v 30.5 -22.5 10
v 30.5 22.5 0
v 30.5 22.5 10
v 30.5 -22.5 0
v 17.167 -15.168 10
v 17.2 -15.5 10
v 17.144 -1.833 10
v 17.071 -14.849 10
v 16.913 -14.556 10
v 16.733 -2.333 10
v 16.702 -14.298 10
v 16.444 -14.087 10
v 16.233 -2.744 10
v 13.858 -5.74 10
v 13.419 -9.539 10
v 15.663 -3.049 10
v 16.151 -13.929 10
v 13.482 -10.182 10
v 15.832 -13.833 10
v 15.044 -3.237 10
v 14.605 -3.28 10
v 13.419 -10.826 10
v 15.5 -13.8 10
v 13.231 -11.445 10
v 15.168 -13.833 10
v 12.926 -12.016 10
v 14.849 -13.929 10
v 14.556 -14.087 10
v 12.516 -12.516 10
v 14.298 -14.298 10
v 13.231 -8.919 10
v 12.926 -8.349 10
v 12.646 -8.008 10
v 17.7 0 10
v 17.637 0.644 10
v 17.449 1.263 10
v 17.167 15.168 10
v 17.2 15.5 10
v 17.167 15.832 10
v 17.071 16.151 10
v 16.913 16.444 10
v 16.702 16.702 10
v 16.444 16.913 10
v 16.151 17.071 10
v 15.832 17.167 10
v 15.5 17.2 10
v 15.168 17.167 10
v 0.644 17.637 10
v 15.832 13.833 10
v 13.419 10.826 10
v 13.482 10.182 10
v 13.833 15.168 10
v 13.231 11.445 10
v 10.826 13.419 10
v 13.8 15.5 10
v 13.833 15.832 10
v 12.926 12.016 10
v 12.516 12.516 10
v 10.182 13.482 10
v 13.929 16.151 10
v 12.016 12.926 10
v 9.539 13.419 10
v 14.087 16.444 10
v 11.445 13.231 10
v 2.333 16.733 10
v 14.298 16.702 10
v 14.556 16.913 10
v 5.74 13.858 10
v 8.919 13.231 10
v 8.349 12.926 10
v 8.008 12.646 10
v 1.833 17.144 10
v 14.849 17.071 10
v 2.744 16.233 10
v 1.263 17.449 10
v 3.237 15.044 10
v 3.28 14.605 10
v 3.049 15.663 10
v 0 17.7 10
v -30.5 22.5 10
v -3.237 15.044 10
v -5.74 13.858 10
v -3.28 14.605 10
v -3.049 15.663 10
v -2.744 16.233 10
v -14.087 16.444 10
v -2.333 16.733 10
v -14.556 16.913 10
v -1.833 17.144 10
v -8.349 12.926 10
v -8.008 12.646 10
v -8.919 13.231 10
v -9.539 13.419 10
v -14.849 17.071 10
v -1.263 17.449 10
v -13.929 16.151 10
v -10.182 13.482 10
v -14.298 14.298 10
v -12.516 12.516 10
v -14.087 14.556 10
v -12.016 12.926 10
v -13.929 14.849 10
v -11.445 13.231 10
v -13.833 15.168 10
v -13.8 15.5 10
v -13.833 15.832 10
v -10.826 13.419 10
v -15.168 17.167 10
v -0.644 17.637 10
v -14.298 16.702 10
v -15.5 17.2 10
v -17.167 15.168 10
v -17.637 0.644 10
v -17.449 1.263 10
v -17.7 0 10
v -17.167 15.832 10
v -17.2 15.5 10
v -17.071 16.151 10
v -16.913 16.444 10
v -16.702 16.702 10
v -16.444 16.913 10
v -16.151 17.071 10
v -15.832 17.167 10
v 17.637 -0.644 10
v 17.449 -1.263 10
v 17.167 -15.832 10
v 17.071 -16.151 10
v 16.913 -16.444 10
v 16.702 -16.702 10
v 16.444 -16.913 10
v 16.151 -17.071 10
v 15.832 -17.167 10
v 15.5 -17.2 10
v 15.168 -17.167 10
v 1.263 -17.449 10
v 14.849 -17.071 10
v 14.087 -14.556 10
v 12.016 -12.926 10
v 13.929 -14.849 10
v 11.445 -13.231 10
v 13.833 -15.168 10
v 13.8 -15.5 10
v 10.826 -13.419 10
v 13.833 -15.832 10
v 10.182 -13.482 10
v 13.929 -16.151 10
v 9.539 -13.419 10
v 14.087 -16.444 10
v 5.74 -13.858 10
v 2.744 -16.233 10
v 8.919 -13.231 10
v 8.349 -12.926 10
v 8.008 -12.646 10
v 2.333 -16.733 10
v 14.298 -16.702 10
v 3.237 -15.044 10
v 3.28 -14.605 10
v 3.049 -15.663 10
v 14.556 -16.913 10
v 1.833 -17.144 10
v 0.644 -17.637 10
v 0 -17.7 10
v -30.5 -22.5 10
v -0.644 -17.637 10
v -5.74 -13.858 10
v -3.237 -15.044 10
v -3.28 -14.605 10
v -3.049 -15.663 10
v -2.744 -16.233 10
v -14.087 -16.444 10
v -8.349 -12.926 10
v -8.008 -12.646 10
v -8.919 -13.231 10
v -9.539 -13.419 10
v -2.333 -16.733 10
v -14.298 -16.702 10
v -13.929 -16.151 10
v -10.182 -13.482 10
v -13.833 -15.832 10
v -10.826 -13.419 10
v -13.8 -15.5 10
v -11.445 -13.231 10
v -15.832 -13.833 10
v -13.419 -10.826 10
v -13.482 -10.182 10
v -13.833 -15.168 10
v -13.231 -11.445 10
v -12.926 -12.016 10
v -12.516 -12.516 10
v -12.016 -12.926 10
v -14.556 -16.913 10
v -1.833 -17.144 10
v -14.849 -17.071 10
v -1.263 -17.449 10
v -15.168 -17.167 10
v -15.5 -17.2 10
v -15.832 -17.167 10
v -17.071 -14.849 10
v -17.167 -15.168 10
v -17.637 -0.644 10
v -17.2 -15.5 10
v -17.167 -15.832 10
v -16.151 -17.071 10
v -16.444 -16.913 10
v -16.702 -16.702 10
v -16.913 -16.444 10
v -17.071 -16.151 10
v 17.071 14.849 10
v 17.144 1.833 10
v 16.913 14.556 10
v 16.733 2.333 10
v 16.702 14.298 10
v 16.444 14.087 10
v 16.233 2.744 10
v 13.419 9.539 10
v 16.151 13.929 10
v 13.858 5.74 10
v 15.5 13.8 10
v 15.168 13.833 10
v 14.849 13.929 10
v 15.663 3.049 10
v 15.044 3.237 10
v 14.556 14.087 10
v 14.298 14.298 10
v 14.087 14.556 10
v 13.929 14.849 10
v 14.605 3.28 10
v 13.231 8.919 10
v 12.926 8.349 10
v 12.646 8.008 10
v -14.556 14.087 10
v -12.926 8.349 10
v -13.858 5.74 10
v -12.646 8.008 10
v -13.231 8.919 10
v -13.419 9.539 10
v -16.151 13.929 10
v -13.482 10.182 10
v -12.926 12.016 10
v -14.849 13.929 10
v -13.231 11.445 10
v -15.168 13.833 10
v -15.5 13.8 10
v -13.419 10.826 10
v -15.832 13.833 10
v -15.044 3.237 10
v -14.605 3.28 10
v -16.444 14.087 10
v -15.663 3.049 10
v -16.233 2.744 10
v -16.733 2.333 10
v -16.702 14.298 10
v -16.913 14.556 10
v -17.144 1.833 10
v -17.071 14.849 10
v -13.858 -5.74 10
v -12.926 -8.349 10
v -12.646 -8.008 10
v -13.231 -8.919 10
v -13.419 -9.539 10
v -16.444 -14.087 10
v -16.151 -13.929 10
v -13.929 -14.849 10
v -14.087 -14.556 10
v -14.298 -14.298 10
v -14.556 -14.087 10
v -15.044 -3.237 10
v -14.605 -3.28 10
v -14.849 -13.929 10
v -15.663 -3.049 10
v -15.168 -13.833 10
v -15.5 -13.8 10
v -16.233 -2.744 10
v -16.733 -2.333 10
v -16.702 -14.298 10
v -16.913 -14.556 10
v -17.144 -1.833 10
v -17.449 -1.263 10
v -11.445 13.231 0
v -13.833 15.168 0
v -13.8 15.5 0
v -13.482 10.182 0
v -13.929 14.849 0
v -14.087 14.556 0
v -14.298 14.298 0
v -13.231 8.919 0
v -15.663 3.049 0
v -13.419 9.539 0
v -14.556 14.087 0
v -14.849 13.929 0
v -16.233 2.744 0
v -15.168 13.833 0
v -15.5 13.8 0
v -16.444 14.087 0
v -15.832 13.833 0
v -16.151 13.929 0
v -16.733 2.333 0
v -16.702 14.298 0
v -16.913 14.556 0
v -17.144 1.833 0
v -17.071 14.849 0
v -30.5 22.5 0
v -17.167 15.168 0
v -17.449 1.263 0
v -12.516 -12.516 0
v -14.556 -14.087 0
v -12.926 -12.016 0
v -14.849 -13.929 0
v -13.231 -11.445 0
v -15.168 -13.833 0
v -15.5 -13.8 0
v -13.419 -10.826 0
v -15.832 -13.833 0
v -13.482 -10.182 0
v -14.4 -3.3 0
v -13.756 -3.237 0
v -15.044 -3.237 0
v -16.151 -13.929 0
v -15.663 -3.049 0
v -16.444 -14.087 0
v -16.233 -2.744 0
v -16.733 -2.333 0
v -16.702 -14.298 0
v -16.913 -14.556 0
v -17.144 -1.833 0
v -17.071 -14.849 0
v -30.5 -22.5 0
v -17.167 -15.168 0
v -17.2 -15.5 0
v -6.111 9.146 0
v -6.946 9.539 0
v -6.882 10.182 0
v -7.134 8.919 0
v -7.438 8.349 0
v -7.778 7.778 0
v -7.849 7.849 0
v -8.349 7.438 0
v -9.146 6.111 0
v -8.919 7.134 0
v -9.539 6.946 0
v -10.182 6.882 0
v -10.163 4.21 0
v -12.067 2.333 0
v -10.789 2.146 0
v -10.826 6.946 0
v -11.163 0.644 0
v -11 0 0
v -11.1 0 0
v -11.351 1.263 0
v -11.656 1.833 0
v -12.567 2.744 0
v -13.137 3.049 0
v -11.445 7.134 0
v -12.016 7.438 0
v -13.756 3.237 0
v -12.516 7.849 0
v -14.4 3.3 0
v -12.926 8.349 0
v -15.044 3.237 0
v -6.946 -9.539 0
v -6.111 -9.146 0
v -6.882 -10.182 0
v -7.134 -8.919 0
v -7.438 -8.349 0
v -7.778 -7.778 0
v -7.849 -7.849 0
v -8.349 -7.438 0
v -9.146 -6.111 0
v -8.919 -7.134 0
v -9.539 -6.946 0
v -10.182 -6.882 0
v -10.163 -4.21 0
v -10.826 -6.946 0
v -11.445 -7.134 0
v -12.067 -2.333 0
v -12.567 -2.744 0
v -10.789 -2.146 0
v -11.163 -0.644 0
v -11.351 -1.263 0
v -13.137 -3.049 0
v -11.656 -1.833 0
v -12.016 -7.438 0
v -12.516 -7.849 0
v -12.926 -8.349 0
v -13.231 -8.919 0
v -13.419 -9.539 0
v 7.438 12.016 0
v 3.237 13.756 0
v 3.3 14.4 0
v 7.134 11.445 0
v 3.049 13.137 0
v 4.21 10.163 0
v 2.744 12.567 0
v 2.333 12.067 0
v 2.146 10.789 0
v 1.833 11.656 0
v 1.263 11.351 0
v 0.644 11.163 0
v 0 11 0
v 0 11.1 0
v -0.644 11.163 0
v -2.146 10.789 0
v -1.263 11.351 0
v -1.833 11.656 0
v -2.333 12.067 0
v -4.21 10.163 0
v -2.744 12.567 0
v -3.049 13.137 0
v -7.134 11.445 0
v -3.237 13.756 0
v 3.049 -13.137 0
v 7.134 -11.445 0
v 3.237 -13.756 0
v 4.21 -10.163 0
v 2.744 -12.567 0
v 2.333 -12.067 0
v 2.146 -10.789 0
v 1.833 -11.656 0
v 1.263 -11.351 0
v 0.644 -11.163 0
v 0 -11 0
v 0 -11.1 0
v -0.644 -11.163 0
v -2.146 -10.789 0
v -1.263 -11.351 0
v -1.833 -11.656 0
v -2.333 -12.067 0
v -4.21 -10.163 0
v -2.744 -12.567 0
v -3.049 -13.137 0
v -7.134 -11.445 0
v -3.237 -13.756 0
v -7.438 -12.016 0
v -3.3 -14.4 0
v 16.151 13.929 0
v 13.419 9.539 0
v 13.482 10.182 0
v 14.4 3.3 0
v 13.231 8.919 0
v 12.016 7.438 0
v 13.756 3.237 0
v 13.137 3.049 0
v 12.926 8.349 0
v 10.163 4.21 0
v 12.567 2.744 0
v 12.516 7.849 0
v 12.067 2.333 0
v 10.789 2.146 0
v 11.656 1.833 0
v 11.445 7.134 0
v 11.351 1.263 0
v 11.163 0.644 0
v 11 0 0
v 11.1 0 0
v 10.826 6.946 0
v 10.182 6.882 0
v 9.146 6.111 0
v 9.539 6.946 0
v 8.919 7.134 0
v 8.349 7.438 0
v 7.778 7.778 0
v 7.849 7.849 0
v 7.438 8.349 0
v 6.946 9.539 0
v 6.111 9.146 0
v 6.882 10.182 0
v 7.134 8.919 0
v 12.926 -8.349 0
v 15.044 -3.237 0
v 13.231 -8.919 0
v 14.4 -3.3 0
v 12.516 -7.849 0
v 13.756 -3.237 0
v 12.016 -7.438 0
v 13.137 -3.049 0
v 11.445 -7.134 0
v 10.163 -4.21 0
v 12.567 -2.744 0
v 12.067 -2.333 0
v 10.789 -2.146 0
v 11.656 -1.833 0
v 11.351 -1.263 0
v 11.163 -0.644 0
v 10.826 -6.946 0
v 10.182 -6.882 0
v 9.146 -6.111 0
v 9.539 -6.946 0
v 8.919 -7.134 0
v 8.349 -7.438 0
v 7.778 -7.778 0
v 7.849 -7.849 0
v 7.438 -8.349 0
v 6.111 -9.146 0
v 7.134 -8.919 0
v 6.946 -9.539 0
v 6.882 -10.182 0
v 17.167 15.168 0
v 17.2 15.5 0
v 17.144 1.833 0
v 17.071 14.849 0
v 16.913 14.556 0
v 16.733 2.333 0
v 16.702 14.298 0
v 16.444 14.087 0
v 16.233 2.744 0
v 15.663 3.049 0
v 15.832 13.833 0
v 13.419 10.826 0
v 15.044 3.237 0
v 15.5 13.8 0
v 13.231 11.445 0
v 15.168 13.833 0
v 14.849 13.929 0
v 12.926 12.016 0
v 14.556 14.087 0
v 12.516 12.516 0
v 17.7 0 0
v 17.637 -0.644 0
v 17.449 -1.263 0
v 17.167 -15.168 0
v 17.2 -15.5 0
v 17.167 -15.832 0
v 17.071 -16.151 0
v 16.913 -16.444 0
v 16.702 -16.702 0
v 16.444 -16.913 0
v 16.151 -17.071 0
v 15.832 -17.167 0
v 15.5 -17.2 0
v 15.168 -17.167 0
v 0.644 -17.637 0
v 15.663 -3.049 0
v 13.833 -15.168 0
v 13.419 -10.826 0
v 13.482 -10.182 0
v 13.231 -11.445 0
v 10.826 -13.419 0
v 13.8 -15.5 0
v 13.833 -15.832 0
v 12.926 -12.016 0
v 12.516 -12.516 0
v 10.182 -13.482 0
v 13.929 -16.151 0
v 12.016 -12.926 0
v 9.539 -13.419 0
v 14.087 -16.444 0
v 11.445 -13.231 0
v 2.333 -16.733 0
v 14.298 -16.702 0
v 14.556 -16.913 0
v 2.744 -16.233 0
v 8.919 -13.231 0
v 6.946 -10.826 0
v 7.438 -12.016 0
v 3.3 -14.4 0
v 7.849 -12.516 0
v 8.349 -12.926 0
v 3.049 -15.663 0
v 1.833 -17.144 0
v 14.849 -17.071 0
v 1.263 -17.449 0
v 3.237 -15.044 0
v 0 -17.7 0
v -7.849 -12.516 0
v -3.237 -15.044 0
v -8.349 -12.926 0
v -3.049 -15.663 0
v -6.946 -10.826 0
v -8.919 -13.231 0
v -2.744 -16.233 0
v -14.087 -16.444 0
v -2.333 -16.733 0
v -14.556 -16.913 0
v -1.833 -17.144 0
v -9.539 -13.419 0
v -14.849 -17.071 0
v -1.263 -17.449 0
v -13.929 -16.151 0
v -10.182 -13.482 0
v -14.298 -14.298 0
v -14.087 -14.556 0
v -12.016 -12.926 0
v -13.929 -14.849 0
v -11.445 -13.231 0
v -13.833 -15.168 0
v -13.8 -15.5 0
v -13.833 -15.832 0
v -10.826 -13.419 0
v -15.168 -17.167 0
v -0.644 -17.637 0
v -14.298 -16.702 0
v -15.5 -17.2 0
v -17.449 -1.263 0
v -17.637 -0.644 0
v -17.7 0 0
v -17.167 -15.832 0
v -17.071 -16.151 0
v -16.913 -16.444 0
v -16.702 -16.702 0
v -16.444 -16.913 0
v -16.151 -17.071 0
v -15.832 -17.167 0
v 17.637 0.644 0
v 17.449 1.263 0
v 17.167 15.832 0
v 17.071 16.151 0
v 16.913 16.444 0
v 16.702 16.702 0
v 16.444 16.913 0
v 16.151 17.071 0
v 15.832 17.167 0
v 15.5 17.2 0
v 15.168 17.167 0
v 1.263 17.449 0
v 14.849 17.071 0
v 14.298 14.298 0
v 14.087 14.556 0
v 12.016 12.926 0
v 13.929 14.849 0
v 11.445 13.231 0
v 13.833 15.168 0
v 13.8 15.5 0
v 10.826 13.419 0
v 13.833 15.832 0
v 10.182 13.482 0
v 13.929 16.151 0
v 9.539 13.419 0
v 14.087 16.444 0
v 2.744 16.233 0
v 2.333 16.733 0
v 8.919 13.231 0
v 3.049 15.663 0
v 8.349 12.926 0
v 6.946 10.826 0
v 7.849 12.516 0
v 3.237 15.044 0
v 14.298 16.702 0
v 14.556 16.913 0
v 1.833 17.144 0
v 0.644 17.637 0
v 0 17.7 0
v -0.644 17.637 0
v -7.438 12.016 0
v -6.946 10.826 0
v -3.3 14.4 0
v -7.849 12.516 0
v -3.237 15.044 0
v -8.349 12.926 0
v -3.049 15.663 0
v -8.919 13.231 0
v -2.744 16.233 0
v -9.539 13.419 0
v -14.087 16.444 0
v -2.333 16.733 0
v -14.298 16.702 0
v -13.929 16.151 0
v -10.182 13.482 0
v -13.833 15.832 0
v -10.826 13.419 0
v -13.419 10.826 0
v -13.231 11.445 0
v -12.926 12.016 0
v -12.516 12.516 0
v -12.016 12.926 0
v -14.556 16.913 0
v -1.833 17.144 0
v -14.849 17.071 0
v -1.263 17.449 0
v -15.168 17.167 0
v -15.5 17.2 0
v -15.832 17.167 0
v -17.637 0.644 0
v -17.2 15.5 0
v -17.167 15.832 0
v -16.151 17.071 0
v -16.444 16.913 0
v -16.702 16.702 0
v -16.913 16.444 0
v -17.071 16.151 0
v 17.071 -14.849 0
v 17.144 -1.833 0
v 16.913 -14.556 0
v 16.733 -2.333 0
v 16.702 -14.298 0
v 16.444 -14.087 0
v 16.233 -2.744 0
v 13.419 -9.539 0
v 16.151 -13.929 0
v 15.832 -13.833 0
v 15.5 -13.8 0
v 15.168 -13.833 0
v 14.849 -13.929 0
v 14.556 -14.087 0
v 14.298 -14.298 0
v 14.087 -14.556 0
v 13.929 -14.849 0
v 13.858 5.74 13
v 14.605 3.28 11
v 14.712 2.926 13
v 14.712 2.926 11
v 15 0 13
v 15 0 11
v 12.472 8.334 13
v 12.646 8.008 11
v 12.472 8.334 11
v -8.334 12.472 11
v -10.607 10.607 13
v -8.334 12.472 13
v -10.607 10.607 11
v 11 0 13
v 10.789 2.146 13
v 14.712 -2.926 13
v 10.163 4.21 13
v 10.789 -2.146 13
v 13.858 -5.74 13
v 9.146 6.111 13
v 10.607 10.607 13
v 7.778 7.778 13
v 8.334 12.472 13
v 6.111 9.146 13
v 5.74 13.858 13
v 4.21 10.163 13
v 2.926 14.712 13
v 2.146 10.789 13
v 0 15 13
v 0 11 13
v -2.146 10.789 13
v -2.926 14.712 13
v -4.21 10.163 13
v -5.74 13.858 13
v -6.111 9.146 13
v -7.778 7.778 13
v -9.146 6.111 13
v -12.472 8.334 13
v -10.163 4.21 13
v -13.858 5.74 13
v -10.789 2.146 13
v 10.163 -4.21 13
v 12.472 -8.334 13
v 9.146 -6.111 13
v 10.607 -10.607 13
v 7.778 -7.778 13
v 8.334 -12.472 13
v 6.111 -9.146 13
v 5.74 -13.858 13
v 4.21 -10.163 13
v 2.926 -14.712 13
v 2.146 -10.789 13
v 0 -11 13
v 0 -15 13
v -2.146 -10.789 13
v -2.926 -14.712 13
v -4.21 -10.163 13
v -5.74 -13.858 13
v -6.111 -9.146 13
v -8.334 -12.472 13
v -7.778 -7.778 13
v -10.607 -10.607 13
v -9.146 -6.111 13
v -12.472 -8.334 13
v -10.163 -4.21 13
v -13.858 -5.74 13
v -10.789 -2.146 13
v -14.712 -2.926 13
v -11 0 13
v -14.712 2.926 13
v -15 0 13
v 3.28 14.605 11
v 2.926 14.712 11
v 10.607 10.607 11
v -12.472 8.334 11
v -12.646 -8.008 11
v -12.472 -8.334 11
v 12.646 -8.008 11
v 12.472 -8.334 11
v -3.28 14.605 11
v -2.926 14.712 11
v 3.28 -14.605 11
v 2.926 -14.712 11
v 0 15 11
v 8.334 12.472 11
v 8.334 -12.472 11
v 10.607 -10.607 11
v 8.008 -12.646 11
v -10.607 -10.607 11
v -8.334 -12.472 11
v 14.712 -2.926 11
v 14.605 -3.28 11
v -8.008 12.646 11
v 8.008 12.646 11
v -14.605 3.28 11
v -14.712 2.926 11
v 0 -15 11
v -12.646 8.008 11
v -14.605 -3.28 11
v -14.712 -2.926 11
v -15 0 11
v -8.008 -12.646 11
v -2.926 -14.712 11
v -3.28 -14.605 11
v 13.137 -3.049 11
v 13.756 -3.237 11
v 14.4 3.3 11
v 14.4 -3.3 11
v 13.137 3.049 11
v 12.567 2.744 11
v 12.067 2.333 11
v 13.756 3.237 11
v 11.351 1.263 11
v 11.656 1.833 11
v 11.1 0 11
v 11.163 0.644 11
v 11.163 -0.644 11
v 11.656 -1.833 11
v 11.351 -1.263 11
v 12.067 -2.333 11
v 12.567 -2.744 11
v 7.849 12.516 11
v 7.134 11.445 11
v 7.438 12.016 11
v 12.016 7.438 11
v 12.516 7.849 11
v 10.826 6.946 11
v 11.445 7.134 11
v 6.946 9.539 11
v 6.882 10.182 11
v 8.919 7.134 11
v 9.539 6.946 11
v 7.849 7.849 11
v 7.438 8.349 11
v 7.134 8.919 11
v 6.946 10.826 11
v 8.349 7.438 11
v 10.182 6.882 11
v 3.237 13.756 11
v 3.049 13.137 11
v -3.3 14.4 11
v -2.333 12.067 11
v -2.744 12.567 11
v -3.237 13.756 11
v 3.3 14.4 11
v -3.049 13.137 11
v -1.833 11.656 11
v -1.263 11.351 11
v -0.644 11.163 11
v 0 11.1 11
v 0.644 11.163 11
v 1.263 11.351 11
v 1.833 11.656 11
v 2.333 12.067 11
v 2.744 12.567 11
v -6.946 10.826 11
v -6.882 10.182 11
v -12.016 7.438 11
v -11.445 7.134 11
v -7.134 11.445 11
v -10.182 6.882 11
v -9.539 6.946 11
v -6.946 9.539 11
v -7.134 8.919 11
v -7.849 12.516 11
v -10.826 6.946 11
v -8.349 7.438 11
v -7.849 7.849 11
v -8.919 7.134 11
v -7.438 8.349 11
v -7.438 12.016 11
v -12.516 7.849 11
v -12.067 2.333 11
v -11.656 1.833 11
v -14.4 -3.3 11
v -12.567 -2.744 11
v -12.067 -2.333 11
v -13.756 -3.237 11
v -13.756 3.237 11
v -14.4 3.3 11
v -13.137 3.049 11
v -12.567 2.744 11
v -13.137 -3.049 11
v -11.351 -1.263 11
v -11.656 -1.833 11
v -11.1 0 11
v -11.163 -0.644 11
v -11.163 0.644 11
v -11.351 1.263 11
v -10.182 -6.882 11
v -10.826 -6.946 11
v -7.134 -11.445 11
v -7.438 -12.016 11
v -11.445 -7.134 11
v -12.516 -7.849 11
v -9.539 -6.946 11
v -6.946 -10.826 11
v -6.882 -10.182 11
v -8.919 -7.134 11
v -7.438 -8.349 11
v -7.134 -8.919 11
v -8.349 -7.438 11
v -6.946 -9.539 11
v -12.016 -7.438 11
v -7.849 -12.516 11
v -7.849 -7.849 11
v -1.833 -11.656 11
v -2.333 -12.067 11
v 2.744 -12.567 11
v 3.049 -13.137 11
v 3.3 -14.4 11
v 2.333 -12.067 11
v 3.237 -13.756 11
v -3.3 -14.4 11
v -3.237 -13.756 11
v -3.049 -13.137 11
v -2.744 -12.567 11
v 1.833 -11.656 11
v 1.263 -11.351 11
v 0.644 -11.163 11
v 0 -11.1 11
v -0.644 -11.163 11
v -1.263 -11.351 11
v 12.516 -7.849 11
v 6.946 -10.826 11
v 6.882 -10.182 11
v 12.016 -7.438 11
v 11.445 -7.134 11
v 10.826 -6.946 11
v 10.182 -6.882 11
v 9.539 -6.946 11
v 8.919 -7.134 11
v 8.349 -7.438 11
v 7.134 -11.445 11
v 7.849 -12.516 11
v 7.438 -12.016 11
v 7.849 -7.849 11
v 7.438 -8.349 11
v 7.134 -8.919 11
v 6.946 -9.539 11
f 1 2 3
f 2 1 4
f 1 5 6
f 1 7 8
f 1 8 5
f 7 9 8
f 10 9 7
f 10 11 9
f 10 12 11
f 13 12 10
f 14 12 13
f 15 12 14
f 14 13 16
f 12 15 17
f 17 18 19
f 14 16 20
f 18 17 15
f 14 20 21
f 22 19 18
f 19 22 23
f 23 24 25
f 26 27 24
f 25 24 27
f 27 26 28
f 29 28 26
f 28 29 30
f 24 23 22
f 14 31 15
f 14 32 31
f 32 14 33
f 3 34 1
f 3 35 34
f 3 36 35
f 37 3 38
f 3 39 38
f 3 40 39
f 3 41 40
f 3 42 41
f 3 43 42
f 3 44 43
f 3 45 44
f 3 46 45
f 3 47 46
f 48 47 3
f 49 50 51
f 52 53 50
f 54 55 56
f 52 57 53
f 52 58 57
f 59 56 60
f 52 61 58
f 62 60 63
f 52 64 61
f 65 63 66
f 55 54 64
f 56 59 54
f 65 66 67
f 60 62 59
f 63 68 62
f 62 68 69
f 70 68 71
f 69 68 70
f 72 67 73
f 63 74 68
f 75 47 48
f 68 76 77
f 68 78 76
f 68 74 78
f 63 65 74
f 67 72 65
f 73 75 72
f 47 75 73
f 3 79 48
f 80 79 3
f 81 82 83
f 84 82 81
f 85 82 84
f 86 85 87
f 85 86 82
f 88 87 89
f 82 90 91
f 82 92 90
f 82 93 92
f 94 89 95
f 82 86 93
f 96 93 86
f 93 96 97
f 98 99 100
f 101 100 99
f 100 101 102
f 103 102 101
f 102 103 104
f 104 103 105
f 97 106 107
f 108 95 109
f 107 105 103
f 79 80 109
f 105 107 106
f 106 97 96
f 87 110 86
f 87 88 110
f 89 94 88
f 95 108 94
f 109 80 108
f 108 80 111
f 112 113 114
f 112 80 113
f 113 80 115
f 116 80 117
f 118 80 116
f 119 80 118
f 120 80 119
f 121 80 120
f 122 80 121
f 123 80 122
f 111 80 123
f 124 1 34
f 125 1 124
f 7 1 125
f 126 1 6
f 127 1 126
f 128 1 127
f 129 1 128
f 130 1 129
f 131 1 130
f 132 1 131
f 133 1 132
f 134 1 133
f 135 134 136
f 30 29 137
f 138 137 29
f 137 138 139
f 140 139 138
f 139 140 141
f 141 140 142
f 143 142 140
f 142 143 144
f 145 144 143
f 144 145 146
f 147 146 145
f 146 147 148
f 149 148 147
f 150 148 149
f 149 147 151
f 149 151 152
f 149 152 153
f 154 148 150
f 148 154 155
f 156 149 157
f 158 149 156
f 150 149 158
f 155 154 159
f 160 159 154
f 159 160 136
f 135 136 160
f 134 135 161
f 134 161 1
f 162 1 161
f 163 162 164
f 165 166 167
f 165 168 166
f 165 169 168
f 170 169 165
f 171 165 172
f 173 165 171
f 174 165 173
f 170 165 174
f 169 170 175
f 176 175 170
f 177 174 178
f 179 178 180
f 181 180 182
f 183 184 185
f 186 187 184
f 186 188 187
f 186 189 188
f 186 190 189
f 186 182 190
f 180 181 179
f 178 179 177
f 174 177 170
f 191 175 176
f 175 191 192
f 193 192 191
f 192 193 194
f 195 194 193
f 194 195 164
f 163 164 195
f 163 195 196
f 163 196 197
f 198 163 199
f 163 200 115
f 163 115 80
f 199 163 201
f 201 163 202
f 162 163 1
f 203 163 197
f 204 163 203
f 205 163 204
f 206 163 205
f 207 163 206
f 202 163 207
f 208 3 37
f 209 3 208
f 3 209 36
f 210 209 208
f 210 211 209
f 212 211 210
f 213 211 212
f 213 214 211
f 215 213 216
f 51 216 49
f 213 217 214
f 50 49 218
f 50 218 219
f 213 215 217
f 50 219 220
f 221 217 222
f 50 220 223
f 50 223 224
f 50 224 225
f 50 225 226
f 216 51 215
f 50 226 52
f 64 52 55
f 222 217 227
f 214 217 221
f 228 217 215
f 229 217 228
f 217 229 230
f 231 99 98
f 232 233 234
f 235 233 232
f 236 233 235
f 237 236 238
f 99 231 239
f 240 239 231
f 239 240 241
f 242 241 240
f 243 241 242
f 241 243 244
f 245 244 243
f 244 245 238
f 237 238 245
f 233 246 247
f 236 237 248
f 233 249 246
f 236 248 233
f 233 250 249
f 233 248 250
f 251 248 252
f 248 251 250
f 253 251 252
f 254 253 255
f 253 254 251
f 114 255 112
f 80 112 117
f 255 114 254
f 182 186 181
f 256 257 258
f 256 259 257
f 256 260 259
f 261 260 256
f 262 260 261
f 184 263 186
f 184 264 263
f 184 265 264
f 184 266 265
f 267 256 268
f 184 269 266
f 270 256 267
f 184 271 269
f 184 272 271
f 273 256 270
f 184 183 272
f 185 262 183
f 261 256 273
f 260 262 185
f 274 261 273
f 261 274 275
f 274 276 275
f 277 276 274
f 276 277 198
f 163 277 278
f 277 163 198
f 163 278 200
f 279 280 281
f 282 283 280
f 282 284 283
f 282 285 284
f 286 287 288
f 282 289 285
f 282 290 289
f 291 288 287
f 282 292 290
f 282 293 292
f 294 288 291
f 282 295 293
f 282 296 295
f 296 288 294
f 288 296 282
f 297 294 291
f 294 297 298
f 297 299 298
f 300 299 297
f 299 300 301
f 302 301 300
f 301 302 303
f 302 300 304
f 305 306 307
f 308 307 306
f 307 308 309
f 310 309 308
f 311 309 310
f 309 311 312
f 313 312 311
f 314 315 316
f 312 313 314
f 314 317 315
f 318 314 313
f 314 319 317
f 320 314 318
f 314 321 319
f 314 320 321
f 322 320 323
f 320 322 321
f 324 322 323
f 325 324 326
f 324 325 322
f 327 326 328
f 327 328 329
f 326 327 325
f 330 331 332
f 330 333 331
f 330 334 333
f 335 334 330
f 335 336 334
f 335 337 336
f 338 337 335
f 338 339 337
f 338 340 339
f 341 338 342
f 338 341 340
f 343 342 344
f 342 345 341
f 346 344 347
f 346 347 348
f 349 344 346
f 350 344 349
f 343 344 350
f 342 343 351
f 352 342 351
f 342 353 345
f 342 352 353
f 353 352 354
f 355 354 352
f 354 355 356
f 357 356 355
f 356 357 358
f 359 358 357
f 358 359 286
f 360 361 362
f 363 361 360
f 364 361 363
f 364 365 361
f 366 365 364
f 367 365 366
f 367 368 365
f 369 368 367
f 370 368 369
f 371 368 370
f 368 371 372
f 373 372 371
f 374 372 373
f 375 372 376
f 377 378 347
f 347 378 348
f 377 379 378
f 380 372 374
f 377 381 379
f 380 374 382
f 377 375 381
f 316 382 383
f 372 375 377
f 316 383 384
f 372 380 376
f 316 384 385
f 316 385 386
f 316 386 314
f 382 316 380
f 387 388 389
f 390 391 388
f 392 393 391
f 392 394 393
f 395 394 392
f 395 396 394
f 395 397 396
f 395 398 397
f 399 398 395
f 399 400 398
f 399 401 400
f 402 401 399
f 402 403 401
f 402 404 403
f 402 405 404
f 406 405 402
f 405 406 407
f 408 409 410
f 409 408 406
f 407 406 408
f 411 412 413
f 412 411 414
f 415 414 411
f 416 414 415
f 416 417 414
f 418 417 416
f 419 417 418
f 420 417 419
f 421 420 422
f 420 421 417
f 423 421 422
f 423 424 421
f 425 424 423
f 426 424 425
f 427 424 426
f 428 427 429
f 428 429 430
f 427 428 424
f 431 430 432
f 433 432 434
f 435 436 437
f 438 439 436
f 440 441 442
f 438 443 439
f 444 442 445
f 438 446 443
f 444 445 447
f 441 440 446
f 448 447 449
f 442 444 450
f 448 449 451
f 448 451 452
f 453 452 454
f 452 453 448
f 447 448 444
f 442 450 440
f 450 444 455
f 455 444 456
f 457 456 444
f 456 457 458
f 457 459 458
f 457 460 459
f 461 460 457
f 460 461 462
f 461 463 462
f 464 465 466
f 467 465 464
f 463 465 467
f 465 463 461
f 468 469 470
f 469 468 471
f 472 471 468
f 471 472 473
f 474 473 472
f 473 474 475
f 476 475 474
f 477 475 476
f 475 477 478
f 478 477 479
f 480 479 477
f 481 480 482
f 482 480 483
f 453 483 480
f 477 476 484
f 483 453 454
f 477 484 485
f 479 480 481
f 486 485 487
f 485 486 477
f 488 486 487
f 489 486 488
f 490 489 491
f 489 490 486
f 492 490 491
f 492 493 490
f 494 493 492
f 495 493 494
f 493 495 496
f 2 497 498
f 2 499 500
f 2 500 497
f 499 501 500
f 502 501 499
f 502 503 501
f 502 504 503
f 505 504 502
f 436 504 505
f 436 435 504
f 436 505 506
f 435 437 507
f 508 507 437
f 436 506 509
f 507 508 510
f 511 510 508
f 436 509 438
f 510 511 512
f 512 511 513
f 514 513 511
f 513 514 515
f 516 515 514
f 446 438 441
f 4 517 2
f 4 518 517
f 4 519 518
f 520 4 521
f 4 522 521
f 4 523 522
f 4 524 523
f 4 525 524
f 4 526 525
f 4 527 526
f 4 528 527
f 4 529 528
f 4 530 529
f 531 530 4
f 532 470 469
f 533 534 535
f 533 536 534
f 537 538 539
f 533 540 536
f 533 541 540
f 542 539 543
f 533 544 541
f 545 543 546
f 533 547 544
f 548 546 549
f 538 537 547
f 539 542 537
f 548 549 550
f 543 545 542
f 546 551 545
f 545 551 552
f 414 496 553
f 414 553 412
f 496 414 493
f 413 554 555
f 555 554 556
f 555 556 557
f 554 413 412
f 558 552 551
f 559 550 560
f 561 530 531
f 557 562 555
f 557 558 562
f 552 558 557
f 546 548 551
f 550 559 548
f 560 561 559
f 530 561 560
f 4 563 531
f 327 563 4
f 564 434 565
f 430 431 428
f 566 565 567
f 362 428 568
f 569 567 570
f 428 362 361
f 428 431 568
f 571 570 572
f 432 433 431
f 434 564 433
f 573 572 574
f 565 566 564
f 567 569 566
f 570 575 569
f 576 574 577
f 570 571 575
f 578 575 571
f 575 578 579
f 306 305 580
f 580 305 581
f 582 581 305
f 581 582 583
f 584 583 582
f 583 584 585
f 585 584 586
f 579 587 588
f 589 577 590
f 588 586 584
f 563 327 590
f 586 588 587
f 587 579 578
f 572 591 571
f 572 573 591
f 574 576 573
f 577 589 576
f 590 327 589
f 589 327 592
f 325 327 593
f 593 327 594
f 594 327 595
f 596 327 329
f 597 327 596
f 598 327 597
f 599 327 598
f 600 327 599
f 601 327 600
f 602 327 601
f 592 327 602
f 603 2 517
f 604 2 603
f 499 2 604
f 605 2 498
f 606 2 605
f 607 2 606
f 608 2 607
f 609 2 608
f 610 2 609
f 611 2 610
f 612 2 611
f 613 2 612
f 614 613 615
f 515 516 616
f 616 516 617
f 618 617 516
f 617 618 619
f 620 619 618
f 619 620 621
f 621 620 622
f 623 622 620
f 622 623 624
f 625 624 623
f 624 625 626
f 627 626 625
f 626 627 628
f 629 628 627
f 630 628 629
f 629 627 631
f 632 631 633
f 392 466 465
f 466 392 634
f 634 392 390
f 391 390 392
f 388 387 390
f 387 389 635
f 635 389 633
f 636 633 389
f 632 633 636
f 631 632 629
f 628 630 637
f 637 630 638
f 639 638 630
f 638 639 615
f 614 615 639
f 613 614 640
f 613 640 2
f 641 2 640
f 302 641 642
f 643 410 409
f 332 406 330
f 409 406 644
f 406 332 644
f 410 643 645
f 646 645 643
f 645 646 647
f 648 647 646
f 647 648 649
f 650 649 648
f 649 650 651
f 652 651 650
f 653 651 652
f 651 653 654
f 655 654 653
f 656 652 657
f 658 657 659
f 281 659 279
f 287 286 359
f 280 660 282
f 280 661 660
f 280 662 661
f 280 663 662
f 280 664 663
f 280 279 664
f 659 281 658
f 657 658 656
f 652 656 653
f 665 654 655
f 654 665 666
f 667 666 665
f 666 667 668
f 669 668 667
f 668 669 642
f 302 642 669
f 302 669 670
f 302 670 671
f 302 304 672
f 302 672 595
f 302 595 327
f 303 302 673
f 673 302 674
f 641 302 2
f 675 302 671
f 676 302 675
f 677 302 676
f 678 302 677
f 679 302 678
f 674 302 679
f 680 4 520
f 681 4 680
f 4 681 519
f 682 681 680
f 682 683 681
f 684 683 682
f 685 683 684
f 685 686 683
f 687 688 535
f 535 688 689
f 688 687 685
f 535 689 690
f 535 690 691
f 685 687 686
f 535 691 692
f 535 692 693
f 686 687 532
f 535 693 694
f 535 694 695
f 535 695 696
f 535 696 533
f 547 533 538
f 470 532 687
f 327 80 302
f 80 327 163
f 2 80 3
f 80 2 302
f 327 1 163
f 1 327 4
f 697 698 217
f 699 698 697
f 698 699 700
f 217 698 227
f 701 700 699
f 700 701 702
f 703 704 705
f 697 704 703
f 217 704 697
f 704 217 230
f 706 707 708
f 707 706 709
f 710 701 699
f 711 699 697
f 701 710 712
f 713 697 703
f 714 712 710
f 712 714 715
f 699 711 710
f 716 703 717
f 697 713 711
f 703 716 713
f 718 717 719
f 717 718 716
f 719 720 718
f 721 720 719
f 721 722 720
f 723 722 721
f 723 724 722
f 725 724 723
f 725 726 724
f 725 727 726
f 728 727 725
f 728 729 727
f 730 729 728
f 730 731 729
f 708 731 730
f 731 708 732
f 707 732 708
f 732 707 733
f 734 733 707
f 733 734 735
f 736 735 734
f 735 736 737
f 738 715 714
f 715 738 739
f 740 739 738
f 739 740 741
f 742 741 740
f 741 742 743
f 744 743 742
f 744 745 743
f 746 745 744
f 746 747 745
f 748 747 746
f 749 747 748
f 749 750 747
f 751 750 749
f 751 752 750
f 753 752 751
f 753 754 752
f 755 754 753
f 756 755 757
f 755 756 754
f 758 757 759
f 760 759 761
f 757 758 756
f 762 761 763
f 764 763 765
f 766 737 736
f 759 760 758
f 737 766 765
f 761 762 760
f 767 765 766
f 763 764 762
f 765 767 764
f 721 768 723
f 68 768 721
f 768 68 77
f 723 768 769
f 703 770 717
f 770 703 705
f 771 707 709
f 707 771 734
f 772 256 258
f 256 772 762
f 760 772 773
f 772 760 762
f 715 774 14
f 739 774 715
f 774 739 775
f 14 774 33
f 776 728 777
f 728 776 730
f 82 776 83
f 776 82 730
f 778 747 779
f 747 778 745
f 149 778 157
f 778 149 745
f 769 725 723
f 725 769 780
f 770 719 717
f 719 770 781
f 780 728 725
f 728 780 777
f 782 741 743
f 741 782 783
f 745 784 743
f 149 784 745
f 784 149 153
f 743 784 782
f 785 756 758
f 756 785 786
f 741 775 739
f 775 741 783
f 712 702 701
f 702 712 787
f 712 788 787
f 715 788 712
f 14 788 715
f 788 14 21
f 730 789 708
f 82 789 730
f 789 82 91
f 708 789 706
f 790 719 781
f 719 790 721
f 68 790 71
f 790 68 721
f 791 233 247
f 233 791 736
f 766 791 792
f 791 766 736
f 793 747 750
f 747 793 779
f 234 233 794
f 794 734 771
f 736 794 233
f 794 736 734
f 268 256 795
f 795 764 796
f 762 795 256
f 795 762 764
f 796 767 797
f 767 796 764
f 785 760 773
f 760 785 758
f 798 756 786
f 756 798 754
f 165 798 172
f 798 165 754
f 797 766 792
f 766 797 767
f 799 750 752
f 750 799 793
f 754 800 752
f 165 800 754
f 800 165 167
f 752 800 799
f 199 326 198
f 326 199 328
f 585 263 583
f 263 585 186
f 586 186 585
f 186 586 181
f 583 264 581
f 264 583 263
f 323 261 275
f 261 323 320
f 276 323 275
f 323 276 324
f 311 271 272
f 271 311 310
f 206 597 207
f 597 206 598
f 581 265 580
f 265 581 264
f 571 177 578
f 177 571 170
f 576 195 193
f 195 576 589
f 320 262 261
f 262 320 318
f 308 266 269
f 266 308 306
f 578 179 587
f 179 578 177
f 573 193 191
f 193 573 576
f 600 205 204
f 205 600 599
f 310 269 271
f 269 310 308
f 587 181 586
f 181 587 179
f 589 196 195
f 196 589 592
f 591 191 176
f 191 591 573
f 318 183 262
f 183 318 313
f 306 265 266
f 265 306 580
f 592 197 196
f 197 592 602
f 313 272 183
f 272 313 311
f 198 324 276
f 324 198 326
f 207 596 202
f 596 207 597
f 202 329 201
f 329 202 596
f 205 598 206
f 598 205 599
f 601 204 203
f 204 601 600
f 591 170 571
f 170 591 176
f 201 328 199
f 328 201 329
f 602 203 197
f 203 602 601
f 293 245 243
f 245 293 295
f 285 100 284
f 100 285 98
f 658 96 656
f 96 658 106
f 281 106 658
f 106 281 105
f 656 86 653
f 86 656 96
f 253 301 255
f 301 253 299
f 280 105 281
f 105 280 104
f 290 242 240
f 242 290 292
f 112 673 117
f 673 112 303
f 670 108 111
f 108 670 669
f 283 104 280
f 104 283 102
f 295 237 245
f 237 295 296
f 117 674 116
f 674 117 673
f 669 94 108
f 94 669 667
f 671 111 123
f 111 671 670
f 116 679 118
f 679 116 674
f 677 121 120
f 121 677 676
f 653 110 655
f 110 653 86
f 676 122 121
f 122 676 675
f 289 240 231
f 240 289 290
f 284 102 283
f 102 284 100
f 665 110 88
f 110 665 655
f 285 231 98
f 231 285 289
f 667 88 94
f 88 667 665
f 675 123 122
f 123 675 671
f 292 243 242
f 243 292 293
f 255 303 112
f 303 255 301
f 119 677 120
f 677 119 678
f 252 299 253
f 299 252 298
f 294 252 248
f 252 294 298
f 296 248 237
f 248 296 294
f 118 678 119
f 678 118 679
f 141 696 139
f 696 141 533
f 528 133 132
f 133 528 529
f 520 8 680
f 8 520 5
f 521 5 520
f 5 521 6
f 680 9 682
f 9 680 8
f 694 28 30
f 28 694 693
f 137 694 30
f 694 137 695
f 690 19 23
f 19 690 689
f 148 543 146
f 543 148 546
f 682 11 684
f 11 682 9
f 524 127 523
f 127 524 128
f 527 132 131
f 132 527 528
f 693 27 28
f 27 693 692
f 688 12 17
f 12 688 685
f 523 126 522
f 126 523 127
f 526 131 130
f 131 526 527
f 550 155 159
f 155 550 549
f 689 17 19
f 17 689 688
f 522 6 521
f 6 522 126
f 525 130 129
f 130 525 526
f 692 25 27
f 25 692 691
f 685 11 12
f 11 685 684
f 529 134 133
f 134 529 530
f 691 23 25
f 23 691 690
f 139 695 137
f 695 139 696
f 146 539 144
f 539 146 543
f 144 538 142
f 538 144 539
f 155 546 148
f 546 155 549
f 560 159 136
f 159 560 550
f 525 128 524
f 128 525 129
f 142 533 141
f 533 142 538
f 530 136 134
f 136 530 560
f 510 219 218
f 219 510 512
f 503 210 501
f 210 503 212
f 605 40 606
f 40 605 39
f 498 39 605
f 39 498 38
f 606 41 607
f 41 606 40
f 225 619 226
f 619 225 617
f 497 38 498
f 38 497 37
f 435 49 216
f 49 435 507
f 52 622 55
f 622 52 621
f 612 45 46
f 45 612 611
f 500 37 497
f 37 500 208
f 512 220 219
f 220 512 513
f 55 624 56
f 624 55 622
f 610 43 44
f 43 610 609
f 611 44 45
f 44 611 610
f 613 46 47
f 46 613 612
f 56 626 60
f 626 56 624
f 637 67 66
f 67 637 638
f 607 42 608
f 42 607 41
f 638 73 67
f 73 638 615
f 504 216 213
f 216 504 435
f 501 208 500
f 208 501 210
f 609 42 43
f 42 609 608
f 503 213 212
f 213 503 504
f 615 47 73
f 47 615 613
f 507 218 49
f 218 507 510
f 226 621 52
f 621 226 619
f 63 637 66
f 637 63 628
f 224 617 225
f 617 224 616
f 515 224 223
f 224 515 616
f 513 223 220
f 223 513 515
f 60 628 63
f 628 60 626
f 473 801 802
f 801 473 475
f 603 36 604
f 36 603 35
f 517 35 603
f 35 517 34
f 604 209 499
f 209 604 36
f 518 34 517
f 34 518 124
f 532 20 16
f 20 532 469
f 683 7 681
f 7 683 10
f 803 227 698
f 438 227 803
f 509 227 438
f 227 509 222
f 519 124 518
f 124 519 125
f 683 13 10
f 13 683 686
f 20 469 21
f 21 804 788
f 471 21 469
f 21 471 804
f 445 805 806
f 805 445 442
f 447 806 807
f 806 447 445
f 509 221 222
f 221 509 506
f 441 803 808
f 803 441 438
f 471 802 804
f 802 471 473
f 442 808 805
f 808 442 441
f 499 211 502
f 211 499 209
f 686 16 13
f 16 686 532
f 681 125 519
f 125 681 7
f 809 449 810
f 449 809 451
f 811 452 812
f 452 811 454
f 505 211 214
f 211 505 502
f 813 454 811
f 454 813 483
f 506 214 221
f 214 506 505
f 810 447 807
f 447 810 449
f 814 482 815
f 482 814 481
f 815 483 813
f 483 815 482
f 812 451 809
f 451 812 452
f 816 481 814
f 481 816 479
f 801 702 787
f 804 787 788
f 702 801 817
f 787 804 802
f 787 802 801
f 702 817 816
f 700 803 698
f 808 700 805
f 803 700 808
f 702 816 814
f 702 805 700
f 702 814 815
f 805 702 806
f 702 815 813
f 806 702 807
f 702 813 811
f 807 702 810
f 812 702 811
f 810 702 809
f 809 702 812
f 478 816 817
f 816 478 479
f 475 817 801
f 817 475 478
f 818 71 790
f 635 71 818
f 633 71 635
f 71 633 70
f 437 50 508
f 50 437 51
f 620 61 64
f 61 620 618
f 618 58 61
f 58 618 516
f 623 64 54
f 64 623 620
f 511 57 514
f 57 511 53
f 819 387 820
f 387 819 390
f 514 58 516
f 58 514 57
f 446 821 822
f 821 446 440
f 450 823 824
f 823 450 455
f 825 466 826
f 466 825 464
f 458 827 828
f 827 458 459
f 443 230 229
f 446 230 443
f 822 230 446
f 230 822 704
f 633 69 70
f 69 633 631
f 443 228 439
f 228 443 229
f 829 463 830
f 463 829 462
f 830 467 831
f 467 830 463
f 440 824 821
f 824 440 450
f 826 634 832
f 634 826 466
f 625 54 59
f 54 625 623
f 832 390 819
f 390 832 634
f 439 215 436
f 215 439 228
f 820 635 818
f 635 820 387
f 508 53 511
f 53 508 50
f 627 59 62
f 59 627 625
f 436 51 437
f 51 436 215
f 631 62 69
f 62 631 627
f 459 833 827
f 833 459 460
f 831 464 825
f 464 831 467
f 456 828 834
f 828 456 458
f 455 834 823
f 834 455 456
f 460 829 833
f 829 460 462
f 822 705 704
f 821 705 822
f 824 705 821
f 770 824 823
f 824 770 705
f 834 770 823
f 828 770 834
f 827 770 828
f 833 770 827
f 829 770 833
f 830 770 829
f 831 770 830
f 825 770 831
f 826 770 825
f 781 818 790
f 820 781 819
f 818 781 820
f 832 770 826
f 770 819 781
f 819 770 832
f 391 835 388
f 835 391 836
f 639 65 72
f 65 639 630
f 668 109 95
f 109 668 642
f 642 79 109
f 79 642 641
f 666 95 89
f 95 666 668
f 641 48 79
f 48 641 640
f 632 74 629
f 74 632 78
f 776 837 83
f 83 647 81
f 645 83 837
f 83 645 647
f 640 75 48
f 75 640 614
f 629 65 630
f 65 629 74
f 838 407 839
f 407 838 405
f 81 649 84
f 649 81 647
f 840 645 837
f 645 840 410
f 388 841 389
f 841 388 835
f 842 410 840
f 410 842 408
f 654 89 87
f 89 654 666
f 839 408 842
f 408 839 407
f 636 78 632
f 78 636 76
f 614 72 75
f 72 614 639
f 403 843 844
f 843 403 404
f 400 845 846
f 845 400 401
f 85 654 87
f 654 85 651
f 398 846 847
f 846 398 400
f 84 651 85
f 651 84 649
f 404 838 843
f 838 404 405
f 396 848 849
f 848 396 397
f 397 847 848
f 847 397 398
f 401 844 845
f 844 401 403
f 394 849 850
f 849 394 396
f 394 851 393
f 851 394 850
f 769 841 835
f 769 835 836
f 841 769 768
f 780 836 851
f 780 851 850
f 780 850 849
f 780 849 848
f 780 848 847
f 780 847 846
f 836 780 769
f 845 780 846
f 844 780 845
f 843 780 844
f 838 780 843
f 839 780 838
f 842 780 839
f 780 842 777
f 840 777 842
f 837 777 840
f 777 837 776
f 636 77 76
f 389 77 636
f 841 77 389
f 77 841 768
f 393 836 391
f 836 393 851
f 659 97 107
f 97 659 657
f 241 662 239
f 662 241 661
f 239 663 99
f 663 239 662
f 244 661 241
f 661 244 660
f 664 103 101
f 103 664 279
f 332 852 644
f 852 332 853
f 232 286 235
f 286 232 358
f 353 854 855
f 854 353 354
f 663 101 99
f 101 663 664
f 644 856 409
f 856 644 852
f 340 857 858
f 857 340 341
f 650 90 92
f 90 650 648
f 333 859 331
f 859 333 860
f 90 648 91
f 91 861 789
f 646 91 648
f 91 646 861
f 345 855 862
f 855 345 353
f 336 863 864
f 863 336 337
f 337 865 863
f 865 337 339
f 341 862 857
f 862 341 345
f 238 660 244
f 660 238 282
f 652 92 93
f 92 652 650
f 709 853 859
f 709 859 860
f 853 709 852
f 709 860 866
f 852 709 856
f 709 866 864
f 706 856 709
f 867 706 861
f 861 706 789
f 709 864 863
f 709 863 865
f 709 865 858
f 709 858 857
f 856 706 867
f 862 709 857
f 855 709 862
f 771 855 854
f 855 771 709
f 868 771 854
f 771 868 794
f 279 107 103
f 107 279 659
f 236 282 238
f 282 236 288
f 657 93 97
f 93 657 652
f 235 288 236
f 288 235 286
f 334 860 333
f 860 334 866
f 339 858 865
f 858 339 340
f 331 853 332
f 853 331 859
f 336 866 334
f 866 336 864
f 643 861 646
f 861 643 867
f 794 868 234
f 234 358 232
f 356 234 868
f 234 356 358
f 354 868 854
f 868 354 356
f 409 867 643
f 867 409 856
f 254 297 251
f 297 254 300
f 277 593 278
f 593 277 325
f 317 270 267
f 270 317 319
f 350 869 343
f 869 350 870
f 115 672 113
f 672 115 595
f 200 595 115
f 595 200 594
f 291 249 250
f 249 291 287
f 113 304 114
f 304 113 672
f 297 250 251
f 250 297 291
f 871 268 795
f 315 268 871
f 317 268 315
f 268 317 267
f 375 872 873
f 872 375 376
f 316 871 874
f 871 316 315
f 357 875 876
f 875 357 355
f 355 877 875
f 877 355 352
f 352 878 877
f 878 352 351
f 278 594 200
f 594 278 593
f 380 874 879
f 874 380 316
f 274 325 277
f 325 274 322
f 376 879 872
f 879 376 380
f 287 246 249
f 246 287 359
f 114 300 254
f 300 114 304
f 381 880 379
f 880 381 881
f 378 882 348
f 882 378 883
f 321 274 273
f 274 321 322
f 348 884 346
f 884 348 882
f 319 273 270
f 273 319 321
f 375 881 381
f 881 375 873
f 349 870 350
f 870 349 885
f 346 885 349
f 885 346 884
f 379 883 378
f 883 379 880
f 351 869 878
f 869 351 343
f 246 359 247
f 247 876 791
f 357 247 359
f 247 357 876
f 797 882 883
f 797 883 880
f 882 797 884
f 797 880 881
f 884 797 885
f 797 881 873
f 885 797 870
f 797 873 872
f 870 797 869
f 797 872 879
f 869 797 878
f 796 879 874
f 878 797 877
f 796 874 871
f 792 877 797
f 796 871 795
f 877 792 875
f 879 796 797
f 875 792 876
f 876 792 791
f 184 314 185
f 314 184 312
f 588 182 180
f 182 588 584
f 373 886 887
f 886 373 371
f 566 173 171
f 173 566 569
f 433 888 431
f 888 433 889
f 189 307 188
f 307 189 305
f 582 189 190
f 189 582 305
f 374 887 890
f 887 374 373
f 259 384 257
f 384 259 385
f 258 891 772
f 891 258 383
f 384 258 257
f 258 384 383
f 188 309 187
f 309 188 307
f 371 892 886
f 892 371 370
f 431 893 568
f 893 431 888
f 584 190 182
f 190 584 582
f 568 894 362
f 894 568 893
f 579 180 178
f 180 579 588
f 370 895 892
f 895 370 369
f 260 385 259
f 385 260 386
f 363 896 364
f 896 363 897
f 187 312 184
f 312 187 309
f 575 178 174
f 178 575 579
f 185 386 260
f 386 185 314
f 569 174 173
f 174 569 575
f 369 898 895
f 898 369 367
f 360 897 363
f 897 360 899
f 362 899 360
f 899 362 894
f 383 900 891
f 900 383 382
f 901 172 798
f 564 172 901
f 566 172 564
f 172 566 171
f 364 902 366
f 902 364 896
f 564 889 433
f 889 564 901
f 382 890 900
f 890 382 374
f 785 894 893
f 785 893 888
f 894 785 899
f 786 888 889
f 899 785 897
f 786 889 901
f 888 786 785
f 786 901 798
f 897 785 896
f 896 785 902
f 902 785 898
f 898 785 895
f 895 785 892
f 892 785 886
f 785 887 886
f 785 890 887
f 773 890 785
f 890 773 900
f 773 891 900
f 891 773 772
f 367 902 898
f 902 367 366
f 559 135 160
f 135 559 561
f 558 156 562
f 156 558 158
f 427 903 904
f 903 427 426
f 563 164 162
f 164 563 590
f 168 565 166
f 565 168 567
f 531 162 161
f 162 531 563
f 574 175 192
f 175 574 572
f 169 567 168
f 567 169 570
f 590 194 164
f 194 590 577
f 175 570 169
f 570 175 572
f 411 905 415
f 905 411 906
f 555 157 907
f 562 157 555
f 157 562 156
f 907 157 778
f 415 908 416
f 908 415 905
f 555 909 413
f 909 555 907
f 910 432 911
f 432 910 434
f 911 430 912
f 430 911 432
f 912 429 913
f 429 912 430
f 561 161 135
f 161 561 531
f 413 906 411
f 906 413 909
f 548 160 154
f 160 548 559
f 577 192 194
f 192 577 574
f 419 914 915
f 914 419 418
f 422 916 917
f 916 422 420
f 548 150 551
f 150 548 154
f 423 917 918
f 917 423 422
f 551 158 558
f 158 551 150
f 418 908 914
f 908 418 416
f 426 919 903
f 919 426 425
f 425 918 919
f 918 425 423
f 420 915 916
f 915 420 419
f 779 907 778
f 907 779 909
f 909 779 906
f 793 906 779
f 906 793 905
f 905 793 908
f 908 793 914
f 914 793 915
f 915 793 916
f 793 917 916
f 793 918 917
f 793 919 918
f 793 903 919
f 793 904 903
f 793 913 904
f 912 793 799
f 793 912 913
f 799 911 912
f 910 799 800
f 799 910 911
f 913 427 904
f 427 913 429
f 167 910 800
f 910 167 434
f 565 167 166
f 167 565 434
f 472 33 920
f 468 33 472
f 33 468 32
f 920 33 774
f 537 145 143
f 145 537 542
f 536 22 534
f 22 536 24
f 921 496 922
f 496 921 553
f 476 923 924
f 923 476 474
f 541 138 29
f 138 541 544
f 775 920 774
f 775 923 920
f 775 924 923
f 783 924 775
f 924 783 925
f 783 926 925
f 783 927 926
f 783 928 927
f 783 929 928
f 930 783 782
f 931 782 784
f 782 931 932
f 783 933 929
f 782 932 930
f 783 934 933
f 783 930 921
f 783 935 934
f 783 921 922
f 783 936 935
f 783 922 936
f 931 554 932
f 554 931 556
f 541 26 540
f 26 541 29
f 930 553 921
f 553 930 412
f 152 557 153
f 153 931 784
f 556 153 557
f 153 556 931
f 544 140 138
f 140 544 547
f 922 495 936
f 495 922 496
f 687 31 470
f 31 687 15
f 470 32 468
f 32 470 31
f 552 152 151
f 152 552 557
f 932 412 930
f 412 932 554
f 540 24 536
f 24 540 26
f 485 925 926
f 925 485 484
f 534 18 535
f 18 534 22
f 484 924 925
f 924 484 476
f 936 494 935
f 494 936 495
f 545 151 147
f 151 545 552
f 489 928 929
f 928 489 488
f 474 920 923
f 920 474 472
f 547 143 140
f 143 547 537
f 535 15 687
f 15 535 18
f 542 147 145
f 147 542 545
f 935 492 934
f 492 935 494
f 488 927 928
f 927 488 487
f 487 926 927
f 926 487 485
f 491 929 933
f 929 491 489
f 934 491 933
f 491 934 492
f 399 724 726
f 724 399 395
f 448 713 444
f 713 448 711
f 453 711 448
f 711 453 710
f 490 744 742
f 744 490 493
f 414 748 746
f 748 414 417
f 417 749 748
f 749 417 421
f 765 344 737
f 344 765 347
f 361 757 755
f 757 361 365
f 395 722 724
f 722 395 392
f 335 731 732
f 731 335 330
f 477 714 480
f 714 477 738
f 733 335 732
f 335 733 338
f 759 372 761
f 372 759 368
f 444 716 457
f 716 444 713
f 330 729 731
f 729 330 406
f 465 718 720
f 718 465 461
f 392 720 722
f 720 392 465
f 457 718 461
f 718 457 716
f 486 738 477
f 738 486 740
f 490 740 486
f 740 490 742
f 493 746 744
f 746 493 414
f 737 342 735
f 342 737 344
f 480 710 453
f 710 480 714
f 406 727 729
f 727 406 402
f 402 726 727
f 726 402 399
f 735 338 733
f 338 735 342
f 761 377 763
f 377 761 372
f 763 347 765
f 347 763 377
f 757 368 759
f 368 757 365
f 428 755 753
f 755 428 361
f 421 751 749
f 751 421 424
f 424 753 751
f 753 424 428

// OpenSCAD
$fn = 32;

// ----------------------------------------------------------------------
// Motor mount plate: NEMA17, 61 x 45 x 13 mm
// ----------------------------------------------------------------------

// --- parameters (mm) ---
plate_w = 61;             // plate length, X
plate_d = 45;             // plate width, Y
plate_t = 10;             // plate thickness
pattern = 31;             // NEMA17 bolt spacing
motor_d = 3.4;            // NEMA17 screw clearance
pilot_d = 22;             // pilot boss bore
boss_d = 30;              // raised pilot ring
boss_h = 3;               // raised pilot ring height
second_d = 6.6;           // second fastener hole
bc_r = 14.4;              // second bolt circle radius
bc_n = 8;                 // second bolt circle count

module plate() {
  translate([-plate_w / 2, -plate_d / 2, 0]) cube([plate_w, plate_d, plate_t]);
}

module motor_holes() {
  for (sx = [-1, 1]) for (sy = [-1, 1])
    translate([sx * pattern / 2, sy * pattern / 2, -1])
      cylinder(h = plate_t + 2, d = motor_d);
}
module pilot_ring() {
  translate([0, 0, plate_t - 1]) cylinder(h = boss_h + 1, d = boss_d);
}

difference() {
  union() {
    plate();
    pilot_ring();
  }
  motor_holes();
  translate([0, 0, -1]) cylinder(h = plate_t + boss_h + 2, d = pilot_d);
  for (i = [0 : bc_n - 1]) rotate([0, 0, i * 360 / bc_n]) translate([bc_r, 0, -1])    cylinder(h = plate_t + 2, d = second_d);
}
